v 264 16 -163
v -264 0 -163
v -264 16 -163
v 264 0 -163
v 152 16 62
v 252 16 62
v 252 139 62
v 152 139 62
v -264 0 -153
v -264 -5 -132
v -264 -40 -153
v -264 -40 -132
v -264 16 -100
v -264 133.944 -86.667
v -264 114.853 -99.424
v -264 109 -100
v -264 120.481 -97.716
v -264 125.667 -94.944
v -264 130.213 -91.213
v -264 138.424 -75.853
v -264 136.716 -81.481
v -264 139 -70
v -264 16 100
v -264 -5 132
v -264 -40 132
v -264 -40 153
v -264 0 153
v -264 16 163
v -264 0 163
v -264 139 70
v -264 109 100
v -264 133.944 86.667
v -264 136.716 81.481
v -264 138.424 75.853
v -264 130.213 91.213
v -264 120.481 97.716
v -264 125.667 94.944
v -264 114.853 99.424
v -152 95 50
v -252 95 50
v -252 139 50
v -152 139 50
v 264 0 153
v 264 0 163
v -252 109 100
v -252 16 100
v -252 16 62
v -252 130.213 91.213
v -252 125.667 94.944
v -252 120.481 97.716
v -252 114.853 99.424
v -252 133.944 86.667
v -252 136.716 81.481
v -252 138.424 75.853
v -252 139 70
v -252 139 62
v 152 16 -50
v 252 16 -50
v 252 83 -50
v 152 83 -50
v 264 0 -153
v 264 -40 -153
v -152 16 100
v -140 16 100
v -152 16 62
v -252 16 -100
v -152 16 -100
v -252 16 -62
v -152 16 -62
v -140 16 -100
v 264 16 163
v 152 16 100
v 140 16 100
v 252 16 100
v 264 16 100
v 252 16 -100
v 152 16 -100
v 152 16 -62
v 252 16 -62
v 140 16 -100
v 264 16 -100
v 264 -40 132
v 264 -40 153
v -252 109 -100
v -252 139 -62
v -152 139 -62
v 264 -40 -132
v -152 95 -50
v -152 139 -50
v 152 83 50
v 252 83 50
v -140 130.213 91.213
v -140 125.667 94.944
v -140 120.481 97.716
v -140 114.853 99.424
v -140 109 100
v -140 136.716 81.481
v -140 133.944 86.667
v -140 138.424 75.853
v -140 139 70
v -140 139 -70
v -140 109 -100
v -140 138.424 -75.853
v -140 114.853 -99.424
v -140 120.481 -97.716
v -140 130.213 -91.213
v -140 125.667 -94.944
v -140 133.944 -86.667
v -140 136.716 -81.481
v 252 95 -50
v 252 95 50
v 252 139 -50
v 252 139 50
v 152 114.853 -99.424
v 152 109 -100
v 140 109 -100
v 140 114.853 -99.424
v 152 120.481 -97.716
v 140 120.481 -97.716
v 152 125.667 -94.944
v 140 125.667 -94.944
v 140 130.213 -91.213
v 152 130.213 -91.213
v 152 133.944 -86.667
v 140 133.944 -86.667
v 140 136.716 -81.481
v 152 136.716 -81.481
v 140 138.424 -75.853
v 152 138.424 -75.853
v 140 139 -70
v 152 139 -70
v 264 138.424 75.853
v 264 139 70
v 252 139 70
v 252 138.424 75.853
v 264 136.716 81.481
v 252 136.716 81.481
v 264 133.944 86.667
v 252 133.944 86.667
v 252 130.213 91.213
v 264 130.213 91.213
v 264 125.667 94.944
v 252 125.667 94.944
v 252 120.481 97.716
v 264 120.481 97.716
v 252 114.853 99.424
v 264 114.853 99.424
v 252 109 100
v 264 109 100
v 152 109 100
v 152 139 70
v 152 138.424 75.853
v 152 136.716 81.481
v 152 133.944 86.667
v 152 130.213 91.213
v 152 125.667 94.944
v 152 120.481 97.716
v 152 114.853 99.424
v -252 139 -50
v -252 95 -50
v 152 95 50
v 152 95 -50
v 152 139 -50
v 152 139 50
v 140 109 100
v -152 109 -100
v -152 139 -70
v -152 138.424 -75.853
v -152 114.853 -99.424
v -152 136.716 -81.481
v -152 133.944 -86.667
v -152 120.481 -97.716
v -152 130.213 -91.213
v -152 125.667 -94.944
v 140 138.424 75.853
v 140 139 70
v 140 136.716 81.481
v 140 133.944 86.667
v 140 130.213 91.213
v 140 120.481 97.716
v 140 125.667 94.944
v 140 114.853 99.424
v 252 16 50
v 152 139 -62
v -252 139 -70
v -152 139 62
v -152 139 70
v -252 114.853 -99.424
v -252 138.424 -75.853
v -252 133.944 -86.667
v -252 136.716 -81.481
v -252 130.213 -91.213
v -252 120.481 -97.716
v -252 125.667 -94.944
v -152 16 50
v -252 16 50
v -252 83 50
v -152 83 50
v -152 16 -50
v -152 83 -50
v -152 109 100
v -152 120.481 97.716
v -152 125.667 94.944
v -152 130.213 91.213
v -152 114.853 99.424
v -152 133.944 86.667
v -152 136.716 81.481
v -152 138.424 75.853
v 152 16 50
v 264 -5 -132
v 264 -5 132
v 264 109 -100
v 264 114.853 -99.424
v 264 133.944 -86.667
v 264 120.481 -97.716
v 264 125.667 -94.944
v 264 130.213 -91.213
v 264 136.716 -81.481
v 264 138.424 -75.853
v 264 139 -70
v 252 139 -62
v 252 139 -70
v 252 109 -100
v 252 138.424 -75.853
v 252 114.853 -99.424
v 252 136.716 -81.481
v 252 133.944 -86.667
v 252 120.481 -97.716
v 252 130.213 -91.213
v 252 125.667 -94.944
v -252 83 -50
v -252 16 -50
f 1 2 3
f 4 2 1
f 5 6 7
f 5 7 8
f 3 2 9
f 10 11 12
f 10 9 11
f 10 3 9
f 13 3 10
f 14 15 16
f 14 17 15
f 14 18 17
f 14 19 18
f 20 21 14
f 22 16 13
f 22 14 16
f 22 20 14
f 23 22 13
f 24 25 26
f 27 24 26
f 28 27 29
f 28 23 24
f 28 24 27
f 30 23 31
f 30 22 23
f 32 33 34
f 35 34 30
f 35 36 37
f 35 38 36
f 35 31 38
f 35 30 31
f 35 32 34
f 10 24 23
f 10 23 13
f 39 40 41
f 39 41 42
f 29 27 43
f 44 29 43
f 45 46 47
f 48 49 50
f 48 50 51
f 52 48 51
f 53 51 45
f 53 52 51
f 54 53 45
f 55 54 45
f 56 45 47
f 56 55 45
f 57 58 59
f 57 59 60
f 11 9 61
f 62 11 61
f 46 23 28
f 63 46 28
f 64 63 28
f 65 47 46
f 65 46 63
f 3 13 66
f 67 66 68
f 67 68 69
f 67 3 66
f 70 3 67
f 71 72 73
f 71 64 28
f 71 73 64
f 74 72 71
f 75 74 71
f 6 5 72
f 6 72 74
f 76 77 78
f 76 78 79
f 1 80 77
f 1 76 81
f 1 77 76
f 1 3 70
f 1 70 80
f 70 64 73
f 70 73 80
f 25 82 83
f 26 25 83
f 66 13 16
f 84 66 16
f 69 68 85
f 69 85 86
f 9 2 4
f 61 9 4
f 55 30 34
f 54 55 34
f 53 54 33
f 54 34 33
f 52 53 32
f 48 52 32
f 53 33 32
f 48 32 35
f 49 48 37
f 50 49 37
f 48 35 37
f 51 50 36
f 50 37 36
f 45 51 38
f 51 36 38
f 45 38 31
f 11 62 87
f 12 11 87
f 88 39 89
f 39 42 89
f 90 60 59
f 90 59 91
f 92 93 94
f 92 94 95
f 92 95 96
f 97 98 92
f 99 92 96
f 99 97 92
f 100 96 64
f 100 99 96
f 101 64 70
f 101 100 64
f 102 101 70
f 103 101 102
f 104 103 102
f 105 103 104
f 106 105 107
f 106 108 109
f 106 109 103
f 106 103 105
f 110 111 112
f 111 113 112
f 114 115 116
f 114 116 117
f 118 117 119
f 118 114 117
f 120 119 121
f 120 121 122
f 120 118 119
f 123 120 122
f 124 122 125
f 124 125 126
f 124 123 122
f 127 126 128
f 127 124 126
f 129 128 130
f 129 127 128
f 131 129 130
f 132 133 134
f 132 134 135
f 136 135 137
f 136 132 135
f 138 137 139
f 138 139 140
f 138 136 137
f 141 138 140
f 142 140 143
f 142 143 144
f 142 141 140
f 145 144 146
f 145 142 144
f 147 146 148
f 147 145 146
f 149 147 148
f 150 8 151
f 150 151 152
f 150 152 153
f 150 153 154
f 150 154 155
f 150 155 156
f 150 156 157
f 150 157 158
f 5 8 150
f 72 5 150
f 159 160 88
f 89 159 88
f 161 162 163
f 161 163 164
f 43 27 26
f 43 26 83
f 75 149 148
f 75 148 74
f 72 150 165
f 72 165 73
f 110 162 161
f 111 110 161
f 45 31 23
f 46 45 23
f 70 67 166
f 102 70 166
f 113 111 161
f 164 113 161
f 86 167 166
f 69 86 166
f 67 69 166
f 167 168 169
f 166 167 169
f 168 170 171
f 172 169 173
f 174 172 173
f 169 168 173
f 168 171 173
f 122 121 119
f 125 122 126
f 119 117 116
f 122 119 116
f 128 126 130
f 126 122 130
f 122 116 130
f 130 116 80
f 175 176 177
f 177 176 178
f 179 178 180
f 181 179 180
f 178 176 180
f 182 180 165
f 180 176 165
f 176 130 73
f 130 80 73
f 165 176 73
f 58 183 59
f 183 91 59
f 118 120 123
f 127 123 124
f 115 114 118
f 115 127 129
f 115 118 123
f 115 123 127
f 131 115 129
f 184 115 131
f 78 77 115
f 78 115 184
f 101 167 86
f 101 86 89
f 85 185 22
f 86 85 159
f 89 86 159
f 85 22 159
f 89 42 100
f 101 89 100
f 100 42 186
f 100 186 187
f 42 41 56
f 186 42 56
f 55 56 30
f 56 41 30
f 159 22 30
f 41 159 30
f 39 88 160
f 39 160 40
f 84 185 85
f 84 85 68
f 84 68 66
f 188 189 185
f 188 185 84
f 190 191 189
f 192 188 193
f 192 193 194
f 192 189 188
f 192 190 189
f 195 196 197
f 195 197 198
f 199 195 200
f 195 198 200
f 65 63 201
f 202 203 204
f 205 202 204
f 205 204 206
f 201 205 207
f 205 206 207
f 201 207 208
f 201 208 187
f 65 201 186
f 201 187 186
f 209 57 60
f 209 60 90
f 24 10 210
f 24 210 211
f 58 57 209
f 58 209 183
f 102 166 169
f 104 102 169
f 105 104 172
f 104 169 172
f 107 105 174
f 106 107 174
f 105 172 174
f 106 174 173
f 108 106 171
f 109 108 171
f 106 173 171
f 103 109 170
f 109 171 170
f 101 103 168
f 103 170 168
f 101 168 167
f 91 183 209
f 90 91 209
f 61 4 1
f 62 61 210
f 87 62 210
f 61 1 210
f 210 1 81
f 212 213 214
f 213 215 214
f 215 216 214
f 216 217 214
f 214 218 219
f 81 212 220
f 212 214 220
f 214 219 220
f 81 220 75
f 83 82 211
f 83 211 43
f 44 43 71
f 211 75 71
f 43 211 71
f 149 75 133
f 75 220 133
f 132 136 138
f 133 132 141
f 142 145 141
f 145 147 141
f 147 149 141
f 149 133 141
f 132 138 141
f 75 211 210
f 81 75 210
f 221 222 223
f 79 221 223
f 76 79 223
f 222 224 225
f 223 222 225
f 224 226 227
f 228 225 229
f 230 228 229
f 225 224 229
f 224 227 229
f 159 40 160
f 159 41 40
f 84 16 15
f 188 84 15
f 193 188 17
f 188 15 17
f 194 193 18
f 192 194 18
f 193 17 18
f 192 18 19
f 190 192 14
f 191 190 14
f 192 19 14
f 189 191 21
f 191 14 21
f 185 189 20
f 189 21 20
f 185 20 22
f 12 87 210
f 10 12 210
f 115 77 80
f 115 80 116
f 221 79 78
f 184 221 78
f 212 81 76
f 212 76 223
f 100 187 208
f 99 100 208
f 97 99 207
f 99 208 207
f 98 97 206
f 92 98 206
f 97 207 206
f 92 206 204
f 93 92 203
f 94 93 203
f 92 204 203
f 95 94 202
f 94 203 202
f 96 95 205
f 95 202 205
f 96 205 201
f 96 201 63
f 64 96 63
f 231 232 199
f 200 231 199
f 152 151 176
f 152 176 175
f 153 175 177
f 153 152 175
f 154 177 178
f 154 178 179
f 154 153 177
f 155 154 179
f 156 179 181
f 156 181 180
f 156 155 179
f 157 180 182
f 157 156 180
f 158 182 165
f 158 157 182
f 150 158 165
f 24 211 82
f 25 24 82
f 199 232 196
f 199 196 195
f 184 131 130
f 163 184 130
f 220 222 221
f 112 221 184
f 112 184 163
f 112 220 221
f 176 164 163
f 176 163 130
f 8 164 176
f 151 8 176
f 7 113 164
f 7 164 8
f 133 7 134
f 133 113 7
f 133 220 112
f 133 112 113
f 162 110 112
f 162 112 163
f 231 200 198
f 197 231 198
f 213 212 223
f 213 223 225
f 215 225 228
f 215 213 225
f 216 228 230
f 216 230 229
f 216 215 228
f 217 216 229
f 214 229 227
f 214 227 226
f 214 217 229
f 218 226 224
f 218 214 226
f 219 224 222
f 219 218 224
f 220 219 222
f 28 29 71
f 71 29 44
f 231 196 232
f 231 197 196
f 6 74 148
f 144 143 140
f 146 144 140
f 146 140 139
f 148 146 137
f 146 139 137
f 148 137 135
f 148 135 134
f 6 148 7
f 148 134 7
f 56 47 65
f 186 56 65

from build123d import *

# Parameters (mm, degrees)
SKETCH_1_W             = 528
SKETCH_1_H             = 326
EXTRUDE_1_DEPTH        = 16
SKETCH_2_W             = 528
SKETCH_2_H             = 16
EXTRUDE_2_DEPTH        = 40
EXTRUDE_3_DEPTH        = 528
EXTRUDE_4_DEPTH        = 12
PATTERN_LINEAR_1_COUNT = 2
PATTERN_LINEAR_1_PITCH = 112
SKETCH_5_W             = 100
SKETCH_5_H             = 12
EXTRUDE_5_DEPTH        = 123
SKETCH_6_W             = 100
SKETCH_6_H             = 12
EXTRUDE_6_DEPTH        = 100
MIRROR_2_COPY_1_DEPTH  = 12


with BuildPart() as part:
    # 草图1 → 凸台-拉伸1 (new body)
    with BuildSketch(Plane(origin=(0, 0, 0), x_dir=(1, 0, 0), z_dir=(0, 1, 0))):
        Rectangle(SKETCH_1_W, SKETCH_1_H)
    extrude(amount=EXTRUDE_1_DEPTH)

    # 草图2 → 凸台-拉伸2 (add)
    with BuildSketch(Plane.XZ):
        with Locations((0, 145)):
            Rectangle(SKETCH_2_W, SKETCH_2_H)
        with Locations((0, -145)):
            Rectangle(SKETCH_2_W, SKETCH_2_H)
    extrude(amount=EXTRUDE_2_DEPTH)

    # 草图3 → 凸台-拉伸3 (add)
    with BuildSketch(Plane(origin=(264, 0, 0), x_dir=(0, 0, -1), z_dir=(1, 0, 0))):
        Polygon((-137, -40), (-137, 0), (137, 0), (137, -40), (132, -40), (132, -5), (-132, -5), (-132, -40), align=None)
    extrude(amount=-EXTRUDE_3_DEPTH)

    # 草图4 → 凸台-拉伸4 (add)
    with BuildSketch(Plane.ZY.offset(264)):
        with BuildLine():
            Line((-70, 139), (70, 139))
            ThreePointArc((70, 139), (91.213203436, 130.213203436), (100, 109))
            Line((100, 109), (100, 16))
            Line((100, 16), (-100, 16))
            Line((-100, 16), (-100, 109))
            ThreePointArc((-100, 109), (-91.213203436, 130.213203436), (-70, 139))
        make_face()
    extrude_4 = extrude(amount=-EXTRUDE_4_DEPTH)

    # 阵列(线性)1: 凸台-拉伸4 ×2
    with Locations(*[(i * PATTERN_LINEAR_1_PITCH, 0, 0) for i in range(1, PATTERN_LINEAR_1_COUNT)]):
        add(extrude_4)

    # 草图5 → 凸台-拉伸5 (add)
    with BuildSketch(Plane(origin=(0, 16, 0), x_dir=(1, 0, 0), z_dir=(0, 1, 0))):
        with Locations((-202, 56)):
            Rectangle(SKETCH_5_W, SKETCH_5_H)
        with Locations((-202, -56)):
            Rectangle(SKETCH_5_W, SKETCH_5_H)
    extrude_5 = extrude(amount=EXTRUDE_5_DEPTH)

    # 草图6 → 凸台-拉伸6 (add)
    with BuildSketch(Plane.ZY.offset(152)):
        with Locations((0, 89)):
            Rectangle(SKETCH_6_W, SKETCH_6_H)
    extrude_6 = extrude(amount=EXTRUDE_6_DEPTH)

    # 镜向2: 凸台-拉伸4, 凸台-拉伸5, 凸台-拉伸6 across plane
    add(extrude_4.mirror(Plane(origin=(0, 0, 0), x_dir=(0, 0, 1), z_dir=(1, 0, 0))))
    add(extrude_5.mirror(Plane(origin=(0, 0, 0), x_dir=(0, 0, 1), z_dir=(1, 0, 0))))
    add(extrude_6.mirror(Plane(origin=(0, 0, 0), x_dir=(0, 0, 1), z_dir=(1, 0, 0))))

    # 镜向2 copy 1 sketch → 镜向2 copy 1 (add)
    with BuildSketch(Plane(origin=(152, 0, 0), x_dir=(0, 0, 1), z_dir=(1, 0, 0))):
        with BuildLine():
            Line((-70, -139), (70, -139))
            ThreePointArc((70, -139), (91.213203436, -130.213203436), (100, -109))
            Line((100, -109), (100, -16))
            Line((100, -16), (-100, -16))
            Line((-100, -16), (-100, -109))
            ThreePointArc((-100, -109), (-91.213203436, -130.213203436), (-70, -139))
        make_face()
    extrude(amount=-MIRROR_2_COPY_1_DEPTH)


solid = part.part
